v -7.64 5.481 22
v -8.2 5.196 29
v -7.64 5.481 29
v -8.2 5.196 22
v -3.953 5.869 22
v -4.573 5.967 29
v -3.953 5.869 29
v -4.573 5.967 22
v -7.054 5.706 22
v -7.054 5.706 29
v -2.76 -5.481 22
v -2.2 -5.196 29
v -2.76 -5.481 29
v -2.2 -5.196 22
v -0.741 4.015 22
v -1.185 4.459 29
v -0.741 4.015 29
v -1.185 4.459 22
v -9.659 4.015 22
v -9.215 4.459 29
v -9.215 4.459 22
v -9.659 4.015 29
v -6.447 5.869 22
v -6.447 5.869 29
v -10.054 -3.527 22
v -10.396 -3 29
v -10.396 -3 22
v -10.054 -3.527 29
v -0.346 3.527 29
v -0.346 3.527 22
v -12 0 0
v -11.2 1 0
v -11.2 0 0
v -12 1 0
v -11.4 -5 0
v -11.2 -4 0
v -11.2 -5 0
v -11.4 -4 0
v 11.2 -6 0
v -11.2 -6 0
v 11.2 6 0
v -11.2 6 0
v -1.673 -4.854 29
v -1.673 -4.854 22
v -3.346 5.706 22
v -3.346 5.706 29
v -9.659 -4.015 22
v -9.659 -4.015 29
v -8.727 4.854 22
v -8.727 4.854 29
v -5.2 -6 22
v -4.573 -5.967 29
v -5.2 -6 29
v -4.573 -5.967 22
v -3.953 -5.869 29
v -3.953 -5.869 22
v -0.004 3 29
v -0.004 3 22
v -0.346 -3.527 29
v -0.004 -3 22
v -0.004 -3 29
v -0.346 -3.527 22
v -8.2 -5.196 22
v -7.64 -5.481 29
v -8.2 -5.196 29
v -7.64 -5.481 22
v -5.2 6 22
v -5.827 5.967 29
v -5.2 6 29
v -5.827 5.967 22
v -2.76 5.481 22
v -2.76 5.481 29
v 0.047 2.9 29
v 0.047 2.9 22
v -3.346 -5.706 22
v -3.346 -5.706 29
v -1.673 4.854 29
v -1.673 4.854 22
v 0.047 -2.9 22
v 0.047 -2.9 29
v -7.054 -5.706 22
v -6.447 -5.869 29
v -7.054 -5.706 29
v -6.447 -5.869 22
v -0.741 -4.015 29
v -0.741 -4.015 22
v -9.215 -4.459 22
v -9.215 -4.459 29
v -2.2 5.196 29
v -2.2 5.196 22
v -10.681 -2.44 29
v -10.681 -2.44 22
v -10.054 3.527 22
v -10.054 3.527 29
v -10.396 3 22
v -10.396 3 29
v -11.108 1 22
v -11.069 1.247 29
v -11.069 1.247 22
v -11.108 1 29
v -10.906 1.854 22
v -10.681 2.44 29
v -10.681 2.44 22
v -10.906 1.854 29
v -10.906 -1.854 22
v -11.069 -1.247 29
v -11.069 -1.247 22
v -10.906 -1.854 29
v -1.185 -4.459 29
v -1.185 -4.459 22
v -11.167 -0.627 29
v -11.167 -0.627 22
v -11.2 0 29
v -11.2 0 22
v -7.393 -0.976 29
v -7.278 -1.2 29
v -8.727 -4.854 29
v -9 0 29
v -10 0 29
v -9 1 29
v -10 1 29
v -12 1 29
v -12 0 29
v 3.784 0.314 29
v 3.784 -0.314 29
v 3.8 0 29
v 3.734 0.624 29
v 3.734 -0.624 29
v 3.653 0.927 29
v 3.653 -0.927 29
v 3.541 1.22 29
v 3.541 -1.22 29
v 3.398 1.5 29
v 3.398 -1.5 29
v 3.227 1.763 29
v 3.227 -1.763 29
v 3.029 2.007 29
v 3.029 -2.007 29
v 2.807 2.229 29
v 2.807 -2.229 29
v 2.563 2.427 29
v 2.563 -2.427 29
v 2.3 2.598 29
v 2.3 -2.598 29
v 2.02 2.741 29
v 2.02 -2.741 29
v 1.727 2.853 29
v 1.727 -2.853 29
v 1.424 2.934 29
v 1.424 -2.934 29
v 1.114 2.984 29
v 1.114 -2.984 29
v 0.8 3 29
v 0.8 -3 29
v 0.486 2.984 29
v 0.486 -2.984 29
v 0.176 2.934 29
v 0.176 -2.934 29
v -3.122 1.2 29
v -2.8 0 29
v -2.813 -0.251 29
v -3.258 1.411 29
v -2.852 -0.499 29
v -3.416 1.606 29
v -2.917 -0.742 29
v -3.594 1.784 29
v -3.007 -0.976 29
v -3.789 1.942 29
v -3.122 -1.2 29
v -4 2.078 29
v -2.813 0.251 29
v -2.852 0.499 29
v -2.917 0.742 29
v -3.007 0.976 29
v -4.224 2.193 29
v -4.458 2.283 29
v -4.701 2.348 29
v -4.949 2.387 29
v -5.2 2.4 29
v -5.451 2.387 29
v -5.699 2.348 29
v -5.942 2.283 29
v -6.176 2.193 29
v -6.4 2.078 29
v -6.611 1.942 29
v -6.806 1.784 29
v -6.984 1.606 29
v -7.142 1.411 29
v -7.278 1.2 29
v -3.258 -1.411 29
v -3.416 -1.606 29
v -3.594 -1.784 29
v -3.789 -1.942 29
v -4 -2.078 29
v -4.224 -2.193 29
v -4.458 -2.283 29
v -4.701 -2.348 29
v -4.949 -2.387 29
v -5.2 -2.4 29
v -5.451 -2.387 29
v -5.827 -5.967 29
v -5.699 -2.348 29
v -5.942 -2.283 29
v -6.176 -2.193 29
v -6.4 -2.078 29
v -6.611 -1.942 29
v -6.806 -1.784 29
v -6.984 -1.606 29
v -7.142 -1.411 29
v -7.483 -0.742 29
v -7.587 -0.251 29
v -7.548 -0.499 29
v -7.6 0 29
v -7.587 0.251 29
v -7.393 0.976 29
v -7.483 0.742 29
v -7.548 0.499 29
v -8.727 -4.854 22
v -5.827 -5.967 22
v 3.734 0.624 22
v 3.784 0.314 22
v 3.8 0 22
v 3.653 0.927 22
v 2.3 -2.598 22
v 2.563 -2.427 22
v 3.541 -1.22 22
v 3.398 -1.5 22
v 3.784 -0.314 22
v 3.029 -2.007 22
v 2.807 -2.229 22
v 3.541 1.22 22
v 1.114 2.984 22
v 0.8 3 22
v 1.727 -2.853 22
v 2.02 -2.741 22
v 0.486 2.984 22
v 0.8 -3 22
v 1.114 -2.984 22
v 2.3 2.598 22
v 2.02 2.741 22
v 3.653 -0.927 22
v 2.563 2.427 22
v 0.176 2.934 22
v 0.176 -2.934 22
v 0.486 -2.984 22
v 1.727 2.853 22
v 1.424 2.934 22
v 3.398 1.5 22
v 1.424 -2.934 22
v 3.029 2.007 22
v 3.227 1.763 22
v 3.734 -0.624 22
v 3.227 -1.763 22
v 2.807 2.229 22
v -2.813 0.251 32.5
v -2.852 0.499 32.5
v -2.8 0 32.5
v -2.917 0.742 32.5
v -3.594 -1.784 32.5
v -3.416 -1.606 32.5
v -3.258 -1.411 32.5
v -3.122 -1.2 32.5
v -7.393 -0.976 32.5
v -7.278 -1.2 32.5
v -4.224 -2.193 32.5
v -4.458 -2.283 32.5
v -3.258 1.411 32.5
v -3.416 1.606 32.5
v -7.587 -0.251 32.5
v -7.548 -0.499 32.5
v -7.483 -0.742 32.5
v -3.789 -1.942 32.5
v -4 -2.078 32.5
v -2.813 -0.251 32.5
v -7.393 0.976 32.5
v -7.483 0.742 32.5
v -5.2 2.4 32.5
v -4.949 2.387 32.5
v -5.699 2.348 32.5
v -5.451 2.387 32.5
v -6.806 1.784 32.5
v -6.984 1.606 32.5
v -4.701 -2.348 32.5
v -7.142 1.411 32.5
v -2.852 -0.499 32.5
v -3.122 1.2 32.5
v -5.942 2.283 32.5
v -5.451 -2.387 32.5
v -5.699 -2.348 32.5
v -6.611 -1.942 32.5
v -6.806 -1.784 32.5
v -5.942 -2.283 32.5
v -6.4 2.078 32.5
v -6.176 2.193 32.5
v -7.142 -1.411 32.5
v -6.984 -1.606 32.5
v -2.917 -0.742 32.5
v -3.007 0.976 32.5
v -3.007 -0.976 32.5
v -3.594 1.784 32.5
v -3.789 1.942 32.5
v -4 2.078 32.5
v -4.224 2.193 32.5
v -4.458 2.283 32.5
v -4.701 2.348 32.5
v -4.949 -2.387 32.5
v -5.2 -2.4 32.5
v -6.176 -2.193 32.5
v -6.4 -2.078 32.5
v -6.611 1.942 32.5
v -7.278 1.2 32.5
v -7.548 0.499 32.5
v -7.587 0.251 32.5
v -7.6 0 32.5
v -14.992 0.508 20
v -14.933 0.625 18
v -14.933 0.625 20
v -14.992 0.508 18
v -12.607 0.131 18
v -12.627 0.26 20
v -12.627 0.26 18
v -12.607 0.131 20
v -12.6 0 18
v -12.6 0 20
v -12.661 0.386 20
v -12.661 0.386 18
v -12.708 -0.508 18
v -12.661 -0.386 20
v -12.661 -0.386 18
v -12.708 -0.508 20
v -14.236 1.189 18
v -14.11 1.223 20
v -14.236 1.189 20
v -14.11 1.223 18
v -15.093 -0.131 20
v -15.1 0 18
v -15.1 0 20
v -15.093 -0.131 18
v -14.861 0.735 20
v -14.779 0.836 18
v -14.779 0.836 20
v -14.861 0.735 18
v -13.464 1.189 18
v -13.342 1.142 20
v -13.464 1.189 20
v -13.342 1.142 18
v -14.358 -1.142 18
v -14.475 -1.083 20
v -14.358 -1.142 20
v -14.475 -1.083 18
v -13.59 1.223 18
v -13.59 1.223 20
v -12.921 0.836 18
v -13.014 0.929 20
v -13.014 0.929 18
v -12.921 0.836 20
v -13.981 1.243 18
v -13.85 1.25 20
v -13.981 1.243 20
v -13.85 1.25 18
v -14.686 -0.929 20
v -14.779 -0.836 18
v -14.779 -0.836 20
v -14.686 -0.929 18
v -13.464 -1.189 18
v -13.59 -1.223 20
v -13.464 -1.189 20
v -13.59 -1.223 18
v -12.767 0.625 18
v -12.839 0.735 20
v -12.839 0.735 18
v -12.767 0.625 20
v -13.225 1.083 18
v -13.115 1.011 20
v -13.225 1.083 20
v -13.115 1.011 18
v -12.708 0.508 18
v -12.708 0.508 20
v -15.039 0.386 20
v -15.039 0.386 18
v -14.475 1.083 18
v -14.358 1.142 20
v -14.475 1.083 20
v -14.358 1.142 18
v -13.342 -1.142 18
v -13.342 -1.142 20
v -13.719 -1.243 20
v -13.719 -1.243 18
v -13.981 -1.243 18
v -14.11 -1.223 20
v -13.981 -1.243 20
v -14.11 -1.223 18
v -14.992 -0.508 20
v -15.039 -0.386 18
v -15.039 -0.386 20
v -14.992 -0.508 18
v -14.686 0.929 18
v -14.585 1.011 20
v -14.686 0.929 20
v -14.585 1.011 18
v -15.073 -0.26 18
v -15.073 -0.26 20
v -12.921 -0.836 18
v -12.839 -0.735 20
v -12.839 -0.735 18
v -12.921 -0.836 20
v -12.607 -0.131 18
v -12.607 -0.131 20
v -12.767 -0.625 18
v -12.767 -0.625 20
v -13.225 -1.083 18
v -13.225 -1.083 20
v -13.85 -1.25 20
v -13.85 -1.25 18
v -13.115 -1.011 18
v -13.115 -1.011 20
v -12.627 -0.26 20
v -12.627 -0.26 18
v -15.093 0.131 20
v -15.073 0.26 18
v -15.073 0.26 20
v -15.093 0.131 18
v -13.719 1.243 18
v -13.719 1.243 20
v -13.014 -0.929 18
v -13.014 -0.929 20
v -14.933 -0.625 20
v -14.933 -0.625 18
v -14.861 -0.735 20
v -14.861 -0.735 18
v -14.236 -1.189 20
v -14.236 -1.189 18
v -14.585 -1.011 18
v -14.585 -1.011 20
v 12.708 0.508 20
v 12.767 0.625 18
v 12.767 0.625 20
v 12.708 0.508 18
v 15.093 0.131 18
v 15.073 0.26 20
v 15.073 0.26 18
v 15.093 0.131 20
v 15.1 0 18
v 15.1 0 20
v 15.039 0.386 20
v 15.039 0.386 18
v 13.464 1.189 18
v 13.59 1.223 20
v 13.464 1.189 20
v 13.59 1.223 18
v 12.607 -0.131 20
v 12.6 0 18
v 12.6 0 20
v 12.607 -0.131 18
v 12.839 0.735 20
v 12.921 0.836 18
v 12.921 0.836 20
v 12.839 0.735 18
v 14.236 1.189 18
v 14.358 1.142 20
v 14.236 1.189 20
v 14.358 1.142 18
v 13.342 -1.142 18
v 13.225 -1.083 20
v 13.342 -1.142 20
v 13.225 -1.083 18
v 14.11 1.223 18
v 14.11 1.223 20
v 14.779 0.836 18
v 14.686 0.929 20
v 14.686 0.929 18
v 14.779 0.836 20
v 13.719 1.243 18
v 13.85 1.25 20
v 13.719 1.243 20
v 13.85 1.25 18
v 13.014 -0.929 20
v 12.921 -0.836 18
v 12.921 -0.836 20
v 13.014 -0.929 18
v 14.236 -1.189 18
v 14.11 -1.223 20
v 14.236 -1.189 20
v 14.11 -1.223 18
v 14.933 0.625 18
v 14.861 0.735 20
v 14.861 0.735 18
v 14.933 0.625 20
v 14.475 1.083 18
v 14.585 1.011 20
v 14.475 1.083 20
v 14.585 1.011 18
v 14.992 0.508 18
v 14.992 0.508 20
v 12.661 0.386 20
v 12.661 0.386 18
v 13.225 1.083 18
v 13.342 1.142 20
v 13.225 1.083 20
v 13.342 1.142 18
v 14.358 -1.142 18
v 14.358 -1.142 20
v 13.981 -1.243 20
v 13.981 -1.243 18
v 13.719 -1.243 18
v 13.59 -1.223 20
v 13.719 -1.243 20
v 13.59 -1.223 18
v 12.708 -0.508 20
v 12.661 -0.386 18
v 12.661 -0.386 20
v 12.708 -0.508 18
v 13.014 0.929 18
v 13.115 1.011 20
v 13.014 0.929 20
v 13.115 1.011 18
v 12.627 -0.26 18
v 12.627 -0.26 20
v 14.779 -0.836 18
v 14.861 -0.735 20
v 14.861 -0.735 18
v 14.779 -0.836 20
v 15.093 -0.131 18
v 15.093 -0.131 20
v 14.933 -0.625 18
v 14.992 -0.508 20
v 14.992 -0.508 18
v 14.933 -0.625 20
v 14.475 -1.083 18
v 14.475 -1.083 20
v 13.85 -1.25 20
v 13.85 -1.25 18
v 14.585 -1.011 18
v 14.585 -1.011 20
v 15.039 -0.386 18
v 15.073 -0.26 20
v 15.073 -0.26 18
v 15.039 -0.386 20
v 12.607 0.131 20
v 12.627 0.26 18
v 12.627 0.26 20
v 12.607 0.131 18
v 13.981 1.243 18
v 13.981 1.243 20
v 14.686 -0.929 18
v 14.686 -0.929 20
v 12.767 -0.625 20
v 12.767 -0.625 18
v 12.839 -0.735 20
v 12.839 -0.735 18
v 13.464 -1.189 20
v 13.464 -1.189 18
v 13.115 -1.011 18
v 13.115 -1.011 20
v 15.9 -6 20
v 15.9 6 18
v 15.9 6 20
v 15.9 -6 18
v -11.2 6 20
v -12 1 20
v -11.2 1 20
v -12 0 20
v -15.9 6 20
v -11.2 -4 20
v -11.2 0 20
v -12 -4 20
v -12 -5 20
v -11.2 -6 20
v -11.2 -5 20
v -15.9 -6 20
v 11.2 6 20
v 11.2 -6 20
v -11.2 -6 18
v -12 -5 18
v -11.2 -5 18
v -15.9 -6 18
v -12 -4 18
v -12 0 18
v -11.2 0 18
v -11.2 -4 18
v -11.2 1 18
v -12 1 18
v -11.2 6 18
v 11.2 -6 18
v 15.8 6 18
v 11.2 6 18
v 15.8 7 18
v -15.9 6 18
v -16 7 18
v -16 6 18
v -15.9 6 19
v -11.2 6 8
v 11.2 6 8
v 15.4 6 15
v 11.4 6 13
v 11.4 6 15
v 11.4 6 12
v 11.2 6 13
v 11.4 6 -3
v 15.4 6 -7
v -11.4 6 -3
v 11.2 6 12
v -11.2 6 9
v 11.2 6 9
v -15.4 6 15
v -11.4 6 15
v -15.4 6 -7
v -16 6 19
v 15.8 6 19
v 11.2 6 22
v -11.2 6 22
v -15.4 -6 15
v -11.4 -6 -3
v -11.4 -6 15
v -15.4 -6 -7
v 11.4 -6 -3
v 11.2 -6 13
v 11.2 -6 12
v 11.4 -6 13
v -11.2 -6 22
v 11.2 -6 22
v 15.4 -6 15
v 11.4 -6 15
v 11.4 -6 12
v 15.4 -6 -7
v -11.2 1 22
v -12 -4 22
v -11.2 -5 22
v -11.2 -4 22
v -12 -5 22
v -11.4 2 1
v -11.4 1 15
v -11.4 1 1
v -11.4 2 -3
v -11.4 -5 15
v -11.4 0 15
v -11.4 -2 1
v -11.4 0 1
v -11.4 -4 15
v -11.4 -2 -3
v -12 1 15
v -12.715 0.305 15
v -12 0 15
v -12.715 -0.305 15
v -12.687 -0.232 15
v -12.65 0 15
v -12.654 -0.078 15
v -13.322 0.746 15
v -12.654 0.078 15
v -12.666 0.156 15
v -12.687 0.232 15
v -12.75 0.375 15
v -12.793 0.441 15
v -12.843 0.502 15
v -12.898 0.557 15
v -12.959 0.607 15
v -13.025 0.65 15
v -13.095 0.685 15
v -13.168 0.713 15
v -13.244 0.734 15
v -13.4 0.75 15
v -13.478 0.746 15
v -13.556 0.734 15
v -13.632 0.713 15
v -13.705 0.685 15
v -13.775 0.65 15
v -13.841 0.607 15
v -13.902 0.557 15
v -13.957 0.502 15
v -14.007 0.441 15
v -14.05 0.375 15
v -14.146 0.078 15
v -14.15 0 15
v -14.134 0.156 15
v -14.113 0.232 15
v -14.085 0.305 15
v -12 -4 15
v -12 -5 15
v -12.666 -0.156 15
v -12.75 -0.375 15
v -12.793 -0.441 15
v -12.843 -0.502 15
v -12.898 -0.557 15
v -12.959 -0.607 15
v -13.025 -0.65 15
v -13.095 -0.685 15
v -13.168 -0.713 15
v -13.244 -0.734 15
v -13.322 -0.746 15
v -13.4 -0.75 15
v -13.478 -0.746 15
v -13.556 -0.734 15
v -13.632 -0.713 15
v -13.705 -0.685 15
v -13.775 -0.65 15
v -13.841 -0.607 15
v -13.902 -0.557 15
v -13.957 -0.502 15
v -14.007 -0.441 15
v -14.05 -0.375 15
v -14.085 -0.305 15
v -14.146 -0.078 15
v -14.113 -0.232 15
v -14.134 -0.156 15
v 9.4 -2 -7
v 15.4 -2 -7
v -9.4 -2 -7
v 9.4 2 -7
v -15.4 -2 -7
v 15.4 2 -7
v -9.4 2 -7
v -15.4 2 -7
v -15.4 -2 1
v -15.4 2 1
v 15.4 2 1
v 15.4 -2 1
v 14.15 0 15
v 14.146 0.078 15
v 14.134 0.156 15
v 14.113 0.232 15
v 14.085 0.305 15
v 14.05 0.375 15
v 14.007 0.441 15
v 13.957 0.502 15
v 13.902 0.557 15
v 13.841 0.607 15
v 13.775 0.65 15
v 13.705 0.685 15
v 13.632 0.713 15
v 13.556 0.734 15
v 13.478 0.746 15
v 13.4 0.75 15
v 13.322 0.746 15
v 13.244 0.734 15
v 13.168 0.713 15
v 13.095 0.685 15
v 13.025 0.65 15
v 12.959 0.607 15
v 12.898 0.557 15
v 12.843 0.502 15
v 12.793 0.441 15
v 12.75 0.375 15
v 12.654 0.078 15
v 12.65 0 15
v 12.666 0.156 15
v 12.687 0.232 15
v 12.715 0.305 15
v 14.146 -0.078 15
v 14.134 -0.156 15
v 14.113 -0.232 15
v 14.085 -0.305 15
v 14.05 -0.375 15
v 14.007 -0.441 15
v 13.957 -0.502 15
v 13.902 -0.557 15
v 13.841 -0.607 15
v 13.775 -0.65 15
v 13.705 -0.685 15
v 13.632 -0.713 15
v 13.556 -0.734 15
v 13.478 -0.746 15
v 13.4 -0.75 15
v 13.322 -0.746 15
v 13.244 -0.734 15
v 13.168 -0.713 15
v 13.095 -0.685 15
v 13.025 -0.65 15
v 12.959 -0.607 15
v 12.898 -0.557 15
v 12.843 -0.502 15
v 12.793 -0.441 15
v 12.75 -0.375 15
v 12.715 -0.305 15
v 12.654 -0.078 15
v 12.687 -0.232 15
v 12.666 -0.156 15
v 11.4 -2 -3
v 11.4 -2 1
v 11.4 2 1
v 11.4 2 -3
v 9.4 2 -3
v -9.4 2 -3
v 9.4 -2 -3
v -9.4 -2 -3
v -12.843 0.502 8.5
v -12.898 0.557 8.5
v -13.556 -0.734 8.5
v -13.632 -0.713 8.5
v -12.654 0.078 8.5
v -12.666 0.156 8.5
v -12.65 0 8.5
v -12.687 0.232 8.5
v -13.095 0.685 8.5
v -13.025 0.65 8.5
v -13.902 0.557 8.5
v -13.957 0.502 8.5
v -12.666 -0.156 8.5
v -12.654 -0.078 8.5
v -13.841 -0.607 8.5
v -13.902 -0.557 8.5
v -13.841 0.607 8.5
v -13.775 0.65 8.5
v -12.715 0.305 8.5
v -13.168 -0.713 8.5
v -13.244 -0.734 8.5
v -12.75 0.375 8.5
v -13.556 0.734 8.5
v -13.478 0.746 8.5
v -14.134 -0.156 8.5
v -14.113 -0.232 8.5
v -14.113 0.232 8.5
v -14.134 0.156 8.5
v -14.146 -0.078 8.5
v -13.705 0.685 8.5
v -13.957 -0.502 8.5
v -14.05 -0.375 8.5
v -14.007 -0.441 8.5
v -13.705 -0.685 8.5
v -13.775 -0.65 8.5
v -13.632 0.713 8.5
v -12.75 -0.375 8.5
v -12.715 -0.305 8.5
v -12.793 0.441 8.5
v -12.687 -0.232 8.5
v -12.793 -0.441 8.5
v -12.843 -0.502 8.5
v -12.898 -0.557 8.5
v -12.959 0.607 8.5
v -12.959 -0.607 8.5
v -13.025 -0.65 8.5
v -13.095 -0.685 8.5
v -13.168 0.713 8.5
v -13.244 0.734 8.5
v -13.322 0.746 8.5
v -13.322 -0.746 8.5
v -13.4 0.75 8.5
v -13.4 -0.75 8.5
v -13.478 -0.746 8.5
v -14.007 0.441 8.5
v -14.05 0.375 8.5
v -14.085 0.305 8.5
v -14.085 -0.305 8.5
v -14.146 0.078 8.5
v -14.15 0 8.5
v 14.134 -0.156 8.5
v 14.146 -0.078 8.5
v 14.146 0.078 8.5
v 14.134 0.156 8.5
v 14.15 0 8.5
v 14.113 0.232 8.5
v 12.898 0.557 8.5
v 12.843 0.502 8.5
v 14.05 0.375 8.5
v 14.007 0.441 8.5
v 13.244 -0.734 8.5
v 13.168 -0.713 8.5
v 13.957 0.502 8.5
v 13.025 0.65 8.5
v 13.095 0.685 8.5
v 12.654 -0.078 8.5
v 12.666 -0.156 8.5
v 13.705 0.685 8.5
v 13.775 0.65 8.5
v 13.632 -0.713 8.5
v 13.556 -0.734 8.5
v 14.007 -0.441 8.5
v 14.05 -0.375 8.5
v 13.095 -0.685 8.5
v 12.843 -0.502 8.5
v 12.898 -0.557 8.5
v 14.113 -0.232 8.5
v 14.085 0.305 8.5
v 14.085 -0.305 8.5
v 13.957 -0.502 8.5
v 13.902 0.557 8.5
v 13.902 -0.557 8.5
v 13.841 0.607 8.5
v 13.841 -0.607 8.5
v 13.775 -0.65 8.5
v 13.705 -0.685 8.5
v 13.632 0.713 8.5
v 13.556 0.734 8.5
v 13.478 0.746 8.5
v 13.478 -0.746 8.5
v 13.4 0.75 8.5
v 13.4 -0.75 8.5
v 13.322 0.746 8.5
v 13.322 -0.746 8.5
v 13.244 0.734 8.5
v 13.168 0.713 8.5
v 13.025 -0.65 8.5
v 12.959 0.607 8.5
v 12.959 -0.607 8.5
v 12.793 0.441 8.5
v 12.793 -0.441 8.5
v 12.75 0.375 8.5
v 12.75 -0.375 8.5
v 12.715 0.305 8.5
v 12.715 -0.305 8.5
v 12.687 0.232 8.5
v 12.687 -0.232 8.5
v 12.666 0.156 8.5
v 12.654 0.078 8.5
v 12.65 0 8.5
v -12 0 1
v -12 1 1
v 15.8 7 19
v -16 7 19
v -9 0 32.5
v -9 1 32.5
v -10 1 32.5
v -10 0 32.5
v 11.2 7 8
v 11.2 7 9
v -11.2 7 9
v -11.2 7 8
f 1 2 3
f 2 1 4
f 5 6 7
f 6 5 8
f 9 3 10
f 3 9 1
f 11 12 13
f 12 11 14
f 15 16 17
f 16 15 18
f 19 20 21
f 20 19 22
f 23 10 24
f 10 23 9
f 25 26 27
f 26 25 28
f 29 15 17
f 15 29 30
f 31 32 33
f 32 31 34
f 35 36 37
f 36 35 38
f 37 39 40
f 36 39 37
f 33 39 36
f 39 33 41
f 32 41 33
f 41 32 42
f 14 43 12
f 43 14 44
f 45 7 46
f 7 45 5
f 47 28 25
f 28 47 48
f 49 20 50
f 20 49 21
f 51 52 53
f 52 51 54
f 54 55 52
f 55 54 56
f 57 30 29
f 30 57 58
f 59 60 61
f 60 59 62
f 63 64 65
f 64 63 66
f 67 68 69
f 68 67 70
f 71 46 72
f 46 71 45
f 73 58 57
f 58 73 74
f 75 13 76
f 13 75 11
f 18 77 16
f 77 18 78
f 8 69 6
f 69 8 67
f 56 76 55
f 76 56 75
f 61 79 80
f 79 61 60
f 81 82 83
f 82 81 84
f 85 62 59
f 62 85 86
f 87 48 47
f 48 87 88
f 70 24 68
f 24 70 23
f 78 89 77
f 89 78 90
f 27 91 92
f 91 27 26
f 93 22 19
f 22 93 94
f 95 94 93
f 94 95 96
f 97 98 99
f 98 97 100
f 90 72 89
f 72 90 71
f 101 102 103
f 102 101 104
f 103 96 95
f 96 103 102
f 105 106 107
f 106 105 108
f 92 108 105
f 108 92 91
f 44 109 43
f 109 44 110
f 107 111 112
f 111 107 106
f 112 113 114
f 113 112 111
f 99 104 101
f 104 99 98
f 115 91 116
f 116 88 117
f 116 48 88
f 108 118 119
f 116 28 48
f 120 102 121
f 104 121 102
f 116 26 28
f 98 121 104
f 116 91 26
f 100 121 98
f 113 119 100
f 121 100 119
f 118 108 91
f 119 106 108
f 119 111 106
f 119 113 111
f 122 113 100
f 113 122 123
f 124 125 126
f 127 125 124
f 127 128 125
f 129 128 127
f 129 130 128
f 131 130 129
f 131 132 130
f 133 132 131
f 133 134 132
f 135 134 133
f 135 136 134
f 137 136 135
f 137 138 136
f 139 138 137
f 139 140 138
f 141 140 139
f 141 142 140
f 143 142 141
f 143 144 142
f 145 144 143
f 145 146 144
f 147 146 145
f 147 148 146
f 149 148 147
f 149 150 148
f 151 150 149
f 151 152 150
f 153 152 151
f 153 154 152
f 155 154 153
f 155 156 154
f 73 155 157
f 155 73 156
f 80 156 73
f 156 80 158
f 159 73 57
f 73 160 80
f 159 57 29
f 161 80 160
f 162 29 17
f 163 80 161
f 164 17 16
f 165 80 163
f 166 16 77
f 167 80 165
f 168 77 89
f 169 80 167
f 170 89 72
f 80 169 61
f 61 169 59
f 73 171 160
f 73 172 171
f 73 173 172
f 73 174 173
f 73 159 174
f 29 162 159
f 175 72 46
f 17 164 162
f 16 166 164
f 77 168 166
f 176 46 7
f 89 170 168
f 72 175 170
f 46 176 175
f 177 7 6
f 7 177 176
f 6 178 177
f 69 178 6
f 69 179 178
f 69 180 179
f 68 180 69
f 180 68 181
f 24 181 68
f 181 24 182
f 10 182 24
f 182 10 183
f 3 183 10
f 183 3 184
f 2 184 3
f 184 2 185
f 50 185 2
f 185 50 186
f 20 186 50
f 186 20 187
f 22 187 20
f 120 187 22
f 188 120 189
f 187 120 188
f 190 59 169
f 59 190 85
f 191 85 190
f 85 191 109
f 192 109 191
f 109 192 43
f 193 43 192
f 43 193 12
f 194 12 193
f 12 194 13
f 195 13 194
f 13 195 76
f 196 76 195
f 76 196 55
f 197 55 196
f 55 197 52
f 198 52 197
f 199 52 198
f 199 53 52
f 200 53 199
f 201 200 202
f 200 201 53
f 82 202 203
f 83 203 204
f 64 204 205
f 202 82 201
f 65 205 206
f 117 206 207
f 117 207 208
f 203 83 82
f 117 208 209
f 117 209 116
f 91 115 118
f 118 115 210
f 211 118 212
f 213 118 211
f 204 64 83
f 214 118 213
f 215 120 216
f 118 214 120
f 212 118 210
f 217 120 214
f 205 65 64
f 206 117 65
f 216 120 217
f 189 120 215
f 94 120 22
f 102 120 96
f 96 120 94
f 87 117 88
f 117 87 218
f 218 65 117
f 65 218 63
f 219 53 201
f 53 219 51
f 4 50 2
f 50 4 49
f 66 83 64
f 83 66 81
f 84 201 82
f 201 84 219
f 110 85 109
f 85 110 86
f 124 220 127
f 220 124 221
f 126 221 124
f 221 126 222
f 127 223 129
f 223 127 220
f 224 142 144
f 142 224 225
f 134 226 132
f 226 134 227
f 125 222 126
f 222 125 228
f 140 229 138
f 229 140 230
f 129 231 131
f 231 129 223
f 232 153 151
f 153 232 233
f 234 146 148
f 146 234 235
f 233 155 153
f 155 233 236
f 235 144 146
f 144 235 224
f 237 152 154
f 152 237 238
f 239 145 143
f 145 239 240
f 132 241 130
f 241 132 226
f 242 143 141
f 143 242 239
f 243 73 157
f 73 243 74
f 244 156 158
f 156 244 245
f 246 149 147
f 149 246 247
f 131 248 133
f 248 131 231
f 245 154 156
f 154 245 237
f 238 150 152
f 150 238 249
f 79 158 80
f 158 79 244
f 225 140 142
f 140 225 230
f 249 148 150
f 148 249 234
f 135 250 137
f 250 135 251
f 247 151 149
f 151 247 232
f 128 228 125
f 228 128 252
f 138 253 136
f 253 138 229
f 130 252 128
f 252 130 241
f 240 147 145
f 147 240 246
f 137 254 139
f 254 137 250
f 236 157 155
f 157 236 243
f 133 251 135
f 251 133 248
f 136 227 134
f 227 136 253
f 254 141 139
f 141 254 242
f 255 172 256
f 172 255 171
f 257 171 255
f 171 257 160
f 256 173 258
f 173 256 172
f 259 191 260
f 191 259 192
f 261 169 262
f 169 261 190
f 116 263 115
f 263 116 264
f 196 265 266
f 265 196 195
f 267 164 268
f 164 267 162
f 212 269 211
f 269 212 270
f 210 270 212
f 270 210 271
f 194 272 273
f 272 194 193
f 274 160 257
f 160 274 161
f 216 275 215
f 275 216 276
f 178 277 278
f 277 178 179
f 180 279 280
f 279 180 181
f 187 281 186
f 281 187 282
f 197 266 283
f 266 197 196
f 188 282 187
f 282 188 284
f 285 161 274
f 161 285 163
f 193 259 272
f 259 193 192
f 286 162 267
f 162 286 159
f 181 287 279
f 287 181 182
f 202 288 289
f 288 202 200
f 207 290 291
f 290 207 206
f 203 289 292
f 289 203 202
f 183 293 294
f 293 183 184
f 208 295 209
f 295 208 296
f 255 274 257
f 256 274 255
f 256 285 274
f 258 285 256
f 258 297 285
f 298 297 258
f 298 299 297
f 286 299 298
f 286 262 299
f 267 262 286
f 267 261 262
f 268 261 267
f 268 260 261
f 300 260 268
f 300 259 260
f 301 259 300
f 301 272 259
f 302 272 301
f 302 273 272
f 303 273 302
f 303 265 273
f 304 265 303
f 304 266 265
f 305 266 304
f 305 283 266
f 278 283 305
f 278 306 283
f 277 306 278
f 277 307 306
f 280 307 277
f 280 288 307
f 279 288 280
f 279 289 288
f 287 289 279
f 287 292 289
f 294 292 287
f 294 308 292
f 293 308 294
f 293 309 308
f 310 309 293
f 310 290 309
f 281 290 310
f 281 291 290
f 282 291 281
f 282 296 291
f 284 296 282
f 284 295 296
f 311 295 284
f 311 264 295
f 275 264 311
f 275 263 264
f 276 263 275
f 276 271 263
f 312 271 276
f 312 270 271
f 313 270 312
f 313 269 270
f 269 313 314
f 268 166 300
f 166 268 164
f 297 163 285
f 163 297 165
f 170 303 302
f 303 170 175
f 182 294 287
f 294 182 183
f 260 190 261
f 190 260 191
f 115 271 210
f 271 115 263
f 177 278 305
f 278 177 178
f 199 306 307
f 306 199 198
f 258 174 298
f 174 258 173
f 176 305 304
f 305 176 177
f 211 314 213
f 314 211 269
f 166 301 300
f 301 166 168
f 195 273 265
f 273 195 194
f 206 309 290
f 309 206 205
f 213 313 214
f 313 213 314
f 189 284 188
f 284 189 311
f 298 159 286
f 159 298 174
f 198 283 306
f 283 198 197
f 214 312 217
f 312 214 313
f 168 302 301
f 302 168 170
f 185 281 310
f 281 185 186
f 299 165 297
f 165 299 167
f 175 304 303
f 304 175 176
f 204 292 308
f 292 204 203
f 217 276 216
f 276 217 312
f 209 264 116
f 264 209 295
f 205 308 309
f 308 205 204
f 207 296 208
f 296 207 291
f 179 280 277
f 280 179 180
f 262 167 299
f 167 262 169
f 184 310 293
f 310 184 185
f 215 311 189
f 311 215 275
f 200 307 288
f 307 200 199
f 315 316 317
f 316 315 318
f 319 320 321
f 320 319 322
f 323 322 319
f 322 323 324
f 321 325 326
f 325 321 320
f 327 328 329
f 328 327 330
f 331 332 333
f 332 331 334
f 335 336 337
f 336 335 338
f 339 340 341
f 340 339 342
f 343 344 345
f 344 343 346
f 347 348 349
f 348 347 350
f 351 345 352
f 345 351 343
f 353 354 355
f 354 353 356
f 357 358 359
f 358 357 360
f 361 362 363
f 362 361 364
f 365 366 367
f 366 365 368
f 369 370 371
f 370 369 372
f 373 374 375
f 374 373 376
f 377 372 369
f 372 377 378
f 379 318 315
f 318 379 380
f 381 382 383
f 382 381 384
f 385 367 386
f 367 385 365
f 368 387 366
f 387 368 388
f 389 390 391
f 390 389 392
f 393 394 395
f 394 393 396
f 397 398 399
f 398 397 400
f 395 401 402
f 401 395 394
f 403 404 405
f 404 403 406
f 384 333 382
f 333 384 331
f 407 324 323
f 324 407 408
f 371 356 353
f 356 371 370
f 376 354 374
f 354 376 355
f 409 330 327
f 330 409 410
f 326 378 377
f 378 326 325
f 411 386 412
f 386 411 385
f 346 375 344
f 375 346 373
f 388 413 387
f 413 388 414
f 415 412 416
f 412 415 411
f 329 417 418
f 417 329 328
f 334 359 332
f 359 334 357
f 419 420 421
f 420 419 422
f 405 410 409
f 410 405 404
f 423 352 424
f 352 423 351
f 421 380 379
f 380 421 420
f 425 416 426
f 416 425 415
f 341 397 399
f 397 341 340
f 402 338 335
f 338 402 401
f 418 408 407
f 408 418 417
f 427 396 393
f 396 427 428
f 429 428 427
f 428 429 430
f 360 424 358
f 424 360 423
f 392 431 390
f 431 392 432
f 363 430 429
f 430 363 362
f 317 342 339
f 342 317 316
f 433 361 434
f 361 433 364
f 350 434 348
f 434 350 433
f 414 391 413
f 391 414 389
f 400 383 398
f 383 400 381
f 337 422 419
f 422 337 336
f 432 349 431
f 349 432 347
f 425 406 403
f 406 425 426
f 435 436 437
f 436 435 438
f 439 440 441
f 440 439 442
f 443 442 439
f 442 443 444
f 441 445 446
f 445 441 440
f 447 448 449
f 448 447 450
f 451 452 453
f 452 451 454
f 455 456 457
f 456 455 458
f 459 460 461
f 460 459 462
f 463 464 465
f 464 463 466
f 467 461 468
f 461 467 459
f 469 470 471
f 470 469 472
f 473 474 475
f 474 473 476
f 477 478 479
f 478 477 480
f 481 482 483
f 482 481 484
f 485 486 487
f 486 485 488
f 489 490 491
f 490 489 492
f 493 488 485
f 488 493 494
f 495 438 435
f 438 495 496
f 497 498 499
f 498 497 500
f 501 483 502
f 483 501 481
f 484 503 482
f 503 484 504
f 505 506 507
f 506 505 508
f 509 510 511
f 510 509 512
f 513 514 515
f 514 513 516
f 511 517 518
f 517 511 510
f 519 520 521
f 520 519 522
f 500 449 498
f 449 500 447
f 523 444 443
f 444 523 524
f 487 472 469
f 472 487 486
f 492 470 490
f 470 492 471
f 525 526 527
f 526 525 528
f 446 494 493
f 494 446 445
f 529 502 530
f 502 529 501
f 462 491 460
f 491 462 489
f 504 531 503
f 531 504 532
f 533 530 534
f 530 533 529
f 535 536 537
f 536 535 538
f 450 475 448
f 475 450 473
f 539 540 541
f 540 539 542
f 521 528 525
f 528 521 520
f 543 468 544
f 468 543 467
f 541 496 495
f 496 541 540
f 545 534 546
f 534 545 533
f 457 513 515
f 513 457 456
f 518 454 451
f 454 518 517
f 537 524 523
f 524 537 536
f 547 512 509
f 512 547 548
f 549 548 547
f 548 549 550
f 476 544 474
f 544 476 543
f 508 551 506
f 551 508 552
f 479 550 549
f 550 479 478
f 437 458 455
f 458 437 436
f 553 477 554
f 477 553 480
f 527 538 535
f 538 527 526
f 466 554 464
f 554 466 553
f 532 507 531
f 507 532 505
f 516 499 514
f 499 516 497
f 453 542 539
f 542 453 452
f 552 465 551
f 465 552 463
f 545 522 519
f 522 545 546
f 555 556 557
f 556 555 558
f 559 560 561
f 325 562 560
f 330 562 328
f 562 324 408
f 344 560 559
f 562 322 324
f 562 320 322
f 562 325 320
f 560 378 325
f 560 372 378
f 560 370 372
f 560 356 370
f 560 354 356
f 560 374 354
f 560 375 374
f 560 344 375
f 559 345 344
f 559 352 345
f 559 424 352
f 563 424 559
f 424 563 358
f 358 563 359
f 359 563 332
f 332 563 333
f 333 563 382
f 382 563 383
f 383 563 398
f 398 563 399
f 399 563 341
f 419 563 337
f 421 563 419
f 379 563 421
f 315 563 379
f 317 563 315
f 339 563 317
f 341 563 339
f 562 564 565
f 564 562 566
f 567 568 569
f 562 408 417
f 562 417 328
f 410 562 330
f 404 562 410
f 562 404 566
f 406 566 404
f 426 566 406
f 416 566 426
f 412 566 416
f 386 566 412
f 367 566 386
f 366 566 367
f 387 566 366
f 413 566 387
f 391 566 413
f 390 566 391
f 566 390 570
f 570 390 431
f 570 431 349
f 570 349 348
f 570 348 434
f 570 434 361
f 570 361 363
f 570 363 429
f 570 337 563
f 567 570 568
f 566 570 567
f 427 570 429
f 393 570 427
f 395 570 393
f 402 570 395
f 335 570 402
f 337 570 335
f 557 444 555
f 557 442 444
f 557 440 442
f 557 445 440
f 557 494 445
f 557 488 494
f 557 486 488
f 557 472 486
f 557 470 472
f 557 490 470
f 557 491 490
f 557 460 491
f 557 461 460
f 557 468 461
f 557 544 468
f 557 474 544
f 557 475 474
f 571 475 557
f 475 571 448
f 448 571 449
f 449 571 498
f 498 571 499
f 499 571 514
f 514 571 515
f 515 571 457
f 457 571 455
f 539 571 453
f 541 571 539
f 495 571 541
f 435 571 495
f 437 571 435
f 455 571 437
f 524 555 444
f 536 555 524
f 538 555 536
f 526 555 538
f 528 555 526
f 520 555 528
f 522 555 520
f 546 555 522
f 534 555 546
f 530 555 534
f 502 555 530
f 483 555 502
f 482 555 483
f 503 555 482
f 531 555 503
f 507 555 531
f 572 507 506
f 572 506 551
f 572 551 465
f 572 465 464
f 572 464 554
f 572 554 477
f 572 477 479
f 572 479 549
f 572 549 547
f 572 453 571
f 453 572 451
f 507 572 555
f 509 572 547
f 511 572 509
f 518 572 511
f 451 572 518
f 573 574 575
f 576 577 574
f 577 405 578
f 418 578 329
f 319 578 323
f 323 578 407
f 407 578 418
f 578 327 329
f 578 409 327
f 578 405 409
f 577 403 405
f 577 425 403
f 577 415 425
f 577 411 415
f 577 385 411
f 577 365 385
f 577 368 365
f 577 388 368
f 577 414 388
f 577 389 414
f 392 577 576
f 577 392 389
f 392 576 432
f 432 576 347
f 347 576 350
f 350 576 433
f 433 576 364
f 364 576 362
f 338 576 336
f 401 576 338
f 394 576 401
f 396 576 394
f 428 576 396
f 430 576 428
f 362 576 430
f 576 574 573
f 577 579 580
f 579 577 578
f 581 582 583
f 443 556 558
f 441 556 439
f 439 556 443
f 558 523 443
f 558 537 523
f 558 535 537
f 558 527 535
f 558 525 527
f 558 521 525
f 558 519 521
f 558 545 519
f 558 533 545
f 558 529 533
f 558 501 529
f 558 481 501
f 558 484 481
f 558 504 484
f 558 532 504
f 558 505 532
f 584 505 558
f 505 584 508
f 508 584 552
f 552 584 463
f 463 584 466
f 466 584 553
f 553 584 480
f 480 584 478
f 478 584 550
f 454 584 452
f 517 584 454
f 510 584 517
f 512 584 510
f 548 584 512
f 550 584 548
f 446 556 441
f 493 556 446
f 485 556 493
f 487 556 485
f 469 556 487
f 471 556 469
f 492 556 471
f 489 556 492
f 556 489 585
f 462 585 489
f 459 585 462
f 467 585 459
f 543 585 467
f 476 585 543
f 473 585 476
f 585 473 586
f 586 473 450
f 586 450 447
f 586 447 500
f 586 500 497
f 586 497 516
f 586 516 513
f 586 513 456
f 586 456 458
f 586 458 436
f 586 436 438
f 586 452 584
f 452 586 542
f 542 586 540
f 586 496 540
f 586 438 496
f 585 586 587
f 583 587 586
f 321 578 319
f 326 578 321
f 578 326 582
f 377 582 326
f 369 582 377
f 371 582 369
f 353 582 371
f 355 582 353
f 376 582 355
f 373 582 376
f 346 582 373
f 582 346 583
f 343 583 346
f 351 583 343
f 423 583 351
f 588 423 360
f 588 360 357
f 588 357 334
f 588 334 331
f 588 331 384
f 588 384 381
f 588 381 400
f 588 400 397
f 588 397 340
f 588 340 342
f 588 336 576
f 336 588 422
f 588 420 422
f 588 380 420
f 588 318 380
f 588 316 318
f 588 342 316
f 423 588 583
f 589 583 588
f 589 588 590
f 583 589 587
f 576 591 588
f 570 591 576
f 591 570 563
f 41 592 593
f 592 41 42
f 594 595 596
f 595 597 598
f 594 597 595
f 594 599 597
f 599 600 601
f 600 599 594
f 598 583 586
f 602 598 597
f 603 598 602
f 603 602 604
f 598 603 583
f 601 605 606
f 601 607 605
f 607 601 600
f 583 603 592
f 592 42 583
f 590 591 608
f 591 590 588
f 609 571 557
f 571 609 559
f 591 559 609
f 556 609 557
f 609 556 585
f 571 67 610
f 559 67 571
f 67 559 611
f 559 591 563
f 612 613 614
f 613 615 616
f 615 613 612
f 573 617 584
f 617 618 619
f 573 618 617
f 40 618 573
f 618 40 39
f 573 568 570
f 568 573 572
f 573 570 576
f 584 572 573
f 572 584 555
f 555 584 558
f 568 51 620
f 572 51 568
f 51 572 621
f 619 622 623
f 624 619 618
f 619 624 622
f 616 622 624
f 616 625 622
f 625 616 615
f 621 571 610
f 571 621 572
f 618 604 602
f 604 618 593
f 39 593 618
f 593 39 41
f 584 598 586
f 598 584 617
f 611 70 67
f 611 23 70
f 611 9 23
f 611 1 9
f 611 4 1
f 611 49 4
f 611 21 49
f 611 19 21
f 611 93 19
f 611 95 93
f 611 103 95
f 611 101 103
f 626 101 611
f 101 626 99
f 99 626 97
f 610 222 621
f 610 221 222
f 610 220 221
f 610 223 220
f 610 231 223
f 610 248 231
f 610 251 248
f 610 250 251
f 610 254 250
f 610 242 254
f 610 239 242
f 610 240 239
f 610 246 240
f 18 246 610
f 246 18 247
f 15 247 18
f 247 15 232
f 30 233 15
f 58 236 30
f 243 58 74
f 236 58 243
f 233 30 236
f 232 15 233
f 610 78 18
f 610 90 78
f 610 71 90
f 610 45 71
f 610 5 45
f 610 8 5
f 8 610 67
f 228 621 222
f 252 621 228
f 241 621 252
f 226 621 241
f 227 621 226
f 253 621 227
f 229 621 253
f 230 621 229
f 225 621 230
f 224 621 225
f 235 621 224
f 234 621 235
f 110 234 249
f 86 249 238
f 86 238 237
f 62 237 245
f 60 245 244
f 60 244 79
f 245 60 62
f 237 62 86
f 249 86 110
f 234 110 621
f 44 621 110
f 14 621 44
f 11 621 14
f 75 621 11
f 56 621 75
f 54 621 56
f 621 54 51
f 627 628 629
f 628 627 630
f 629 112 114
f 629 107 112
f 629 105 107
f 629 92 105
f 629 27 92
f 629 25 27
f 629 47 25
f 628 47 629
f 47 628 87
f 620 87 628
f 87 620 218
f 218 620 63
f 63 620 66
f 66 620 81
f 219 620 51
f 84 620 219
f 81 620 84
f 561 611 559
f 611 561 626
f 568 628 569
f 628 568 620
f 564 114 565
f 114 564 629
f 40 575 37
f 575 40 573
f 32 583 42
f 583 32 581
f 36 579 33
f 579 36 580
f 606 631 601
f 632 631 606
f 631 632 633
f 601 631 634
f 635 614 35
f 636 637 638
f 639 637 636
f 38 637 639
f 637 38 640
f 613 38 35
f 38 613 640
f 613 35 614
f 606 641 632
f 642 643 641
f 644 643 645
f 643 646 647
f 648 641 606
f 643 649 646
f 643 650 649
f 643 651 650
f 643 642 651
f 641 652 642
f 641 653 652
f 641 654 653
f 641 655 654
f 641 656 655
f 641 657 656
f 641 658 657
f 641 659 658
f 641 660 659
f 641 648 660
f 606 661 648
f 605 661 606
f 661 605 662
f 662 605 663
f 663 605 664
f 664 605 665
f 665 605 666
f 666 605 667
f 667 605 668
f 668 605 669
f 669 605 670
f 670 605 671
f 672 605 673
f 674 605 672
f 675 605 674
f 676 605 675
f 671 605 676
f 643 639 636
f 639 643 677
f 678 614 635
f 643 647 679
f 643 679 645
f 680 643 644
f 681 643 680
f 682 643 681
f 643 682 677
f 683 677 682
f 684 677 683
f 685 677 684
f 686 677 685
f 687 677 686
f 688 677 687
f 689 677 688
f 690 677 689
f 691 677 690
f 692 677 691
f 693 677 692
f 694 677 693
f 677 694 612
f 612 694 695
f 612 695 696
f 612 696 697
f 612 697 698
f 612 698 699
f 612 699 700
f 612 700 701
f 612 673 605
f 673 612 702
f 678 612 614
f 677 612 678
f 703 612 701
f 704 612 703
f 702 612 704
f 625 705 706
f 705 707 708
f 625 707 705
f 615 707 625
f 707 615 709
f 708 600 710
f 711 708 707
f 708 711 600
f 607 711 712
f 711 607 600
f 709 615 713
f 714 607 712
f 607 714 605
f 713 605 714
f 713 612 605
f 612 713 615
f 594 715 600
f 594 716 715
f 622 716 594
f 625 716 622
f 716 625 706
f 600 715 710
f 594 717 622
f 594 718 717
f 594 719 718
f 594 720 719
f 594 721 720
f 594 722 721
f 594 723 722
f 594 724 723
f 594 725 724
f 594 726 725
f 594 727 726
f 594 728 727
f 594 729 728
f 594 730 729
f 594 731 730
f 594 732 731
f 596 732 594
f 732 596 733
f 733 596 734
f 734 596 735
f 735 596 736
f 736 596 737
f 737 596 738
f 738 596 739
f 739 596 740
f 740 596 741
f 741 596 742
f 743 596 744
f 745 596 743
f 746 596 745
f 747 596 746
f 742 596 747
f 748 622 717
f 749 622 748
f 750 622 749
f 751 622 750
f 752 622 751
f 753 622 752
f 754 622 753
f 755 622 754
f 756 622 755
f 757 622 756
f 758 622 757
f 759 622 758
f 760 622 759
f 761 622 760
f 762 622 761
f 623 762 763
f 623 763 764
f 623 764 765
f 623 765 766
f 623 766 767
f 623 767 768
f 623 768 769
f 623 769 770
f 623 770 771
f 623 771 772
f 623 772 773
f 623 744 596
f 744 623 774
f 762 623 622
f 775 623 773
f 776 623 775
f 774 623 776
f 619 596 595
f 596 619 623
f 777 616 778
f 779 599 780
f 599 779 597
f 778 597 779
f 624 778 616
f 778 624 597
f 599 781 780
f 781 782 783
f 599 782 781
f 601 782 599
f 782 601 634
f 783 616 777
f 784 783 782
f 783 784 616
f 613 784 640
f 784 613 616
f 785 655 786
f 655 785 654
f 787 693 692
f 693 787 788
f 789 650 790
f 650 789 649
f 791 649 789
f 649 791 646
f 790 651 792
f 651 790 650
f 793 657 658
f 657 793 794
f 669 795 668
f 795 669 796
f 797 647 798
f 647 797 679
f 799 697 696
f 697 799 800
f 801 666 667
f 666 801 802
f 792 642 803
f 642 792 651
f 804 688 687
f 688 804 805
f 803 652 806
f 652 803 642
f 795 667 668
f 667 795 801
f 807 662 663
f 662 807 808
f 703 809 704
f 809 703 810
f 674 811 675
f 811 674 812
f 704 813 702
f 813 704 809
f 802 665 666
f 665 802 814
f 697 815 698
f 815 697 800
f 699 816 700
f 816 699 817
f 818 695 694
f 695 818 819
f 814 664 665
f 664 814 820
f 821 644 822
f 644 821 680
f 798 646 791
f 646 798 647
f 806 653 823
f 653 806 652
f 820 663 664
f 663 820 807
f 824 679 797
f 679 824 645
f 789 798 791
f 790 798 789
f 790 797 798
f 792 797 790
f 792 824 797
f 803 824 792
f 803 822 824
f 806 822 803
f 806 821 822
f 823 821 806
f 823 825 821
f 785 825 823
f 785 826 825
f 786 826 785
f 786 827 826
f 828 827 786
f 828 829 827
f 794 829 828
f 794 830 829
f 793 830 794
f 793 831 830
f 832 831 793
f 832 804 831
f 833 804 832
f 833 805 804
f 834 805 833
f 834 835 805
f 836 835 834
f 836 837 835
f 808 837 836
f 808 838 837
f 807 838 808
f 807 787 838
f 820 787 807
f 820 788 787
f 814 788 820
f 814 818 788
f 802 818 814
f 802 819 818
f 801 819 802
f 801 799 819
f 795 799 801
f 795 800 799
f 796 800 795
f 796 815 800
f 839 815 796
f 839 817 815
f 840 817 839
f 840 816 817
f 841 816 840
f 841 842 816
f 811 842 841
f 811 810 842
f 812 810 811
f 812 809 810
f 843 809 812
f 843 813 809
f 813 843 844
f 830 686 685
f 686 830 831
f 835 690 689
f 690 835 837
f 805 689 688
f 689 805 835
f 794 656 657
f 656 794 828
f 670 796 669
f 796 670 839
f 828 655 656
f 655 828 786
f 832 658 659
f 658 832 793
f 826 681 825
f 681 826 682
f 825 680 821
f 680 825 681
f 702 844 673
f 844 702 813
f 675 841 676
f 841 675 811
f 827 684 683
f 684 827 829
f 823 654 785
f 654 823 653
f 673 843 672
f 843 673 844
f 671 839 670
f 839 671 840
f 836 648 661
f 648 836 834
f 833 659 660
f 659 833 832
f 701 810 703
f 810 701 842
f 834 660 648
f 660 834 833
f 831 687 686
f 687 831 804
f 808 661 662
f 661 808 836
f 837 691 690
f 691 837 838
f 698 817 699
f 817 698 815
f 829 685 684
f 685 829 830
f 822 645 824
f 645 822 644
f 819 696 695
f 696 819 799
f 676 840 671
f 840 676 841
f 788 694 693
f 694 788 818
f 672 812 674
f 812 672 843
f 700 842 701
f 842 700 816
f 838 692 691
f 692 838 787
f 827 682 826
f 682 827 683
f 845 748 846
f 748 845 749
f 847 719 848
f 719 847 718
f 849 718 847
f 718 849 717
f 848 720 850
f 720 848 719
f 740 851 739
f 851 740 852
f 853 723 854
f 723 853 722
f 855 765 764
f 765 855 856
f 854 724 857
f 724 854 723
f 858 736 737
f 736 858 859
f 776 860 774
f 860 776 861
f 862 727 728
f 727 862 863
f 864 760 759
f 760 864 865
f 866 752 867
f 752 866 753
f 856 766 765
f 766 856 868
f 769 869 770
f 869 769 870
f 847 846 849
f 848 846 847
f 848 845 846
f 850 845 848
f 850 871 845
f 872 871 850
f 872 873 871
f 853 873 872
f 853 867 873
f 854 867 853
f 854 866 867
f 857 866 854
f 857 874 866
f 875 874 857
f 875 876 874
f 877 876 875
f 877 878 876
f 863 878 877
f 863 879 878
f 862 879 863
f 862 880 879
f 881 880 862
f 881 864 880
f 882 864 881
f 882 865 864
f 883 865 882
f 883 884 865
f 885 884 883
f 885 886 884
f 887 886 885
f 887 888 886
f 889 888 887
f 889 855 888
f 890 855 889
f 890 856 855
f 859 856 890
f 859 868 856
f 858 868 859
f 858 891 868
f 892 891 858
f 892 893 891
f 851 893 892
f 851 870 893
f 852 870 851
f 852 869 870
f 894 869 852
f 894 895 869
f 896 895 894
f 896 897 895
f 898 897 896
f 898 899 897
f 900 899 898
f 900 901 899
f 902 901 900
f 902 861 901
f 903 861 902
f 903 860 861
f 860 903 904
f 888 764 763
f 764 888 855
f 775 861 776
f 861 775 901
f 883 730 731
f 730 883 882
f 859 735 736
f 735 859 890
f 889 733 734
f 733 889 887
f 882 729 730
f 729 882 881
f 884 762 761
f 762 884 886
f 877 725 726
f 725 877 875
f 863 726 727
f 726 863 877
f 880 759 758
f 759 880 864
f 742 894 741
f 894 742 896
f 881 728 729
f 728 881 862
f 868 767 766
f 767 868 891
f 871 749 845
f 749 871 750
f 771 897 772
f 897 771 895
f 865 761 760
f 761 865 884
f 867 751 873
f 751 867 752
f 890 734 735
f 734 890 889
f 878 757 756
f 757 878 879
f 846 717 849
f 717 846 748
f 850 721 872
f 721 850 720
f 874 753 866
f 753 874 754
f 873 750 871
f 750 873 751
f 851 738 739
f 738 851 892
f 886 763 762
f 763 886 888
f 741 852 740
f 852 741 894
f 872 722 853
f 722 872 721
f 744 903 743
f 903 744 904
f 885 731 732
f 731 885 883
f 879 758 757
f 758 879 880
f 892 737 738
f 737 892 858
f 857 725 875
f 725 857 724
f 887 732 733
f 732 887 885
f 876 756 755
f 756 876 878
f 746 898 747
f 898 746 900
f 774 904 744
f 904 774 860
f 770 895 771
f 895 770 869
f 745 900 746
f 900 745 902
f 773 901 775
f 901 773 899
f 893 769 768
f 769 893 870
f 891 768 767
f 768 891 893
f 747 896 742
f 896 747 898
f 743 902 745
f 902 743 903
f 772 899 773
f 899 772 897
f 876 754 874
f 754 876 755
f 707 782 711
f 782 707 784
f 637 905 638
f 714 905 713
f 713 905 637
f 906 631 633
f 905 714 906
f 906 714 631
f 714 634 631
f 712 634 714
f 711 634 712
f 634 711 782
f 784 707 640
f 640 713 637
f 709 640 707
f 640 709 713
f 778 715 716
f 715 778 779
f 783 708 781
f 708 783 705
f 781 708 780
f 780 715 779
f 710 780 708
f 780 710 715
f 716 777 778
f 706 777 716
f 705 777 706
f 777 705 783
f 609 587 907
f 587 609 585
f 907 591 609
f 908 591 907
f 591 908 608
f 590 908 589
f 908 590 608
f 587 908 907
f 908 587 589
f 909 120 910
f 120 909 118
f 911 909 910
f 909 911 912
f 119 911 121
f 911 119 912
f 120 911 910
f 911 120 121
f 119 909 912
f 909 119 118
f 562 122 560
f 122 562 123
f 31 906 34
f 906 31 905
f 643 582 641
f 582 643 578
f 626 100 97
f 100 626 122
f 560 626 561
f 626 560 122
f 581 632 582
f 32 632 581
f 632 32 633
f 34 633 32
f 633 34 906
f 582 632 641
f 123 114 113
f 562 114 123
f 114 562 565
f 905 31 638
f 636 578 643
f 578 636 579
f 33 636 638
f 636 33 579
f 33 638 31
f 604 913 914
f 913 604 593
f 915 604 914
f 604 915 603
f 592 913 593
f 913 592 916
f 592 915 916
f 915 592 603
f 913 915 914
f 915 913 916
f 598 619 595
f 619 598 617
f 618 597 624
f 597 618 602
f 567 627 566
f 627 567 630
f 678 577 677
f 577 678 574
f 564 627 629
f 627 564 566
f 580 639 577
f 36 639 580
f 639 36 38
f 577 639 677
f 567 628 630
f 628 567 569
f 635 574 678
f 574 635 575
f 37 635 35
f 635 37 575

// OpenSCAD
// file: motor-gear-mount.scad
// MG90S mount
include <motor-gears.scad>

MG_MOUNT_W = 4;
MG_MOUNT_D = 0.2;
MG_MOUNT_HOLE_D = MG90S_MOUNT_HOLE_D - 1;
MG_MOUNT_SIZE=[
    MG90S_BLOCK_SIZE.x + 2 * (MG_MOUNT_W + MG_MOUNT_D)
    , MG90S_BLOCK_SIZE.y
    , MG90S_MOUNT_OFFSET + MG_MOUNT_W
];


module gear_mount()
{
    $fn=60;
    dx = MG_MOUNT_SIZE.x / 2;
    dy = MG_MOUNT_SIZE.y / 2;
    dz = MG_MOUNT_W;
    
    difference()
    {
        union()
        {
            difference()
            {
                cube([MG_MOUNT_SIZE.x, MG_MOUNT_SIZE.y, MG_MOUNT_W], center=true);
                //translate([(MG90S_BLOCK_SIZE.x - MG90S_GEAR_D1) / 2, 0, 0])
                //cylinder(h = MG_MOUNT_W * 2, d = MG90S_MOUNT_HOLE_D, center = true);
            }
            
            translate([0, 0, (MG_MOUNT_SIZE.z - MG_MOUNT_W) / 2])
            {
                translate([-(dx - MG_MOUNT_W / 2), 0, 0])
                {
                    cube([MG_MOUNT_W, MG_MOUNT_SIZE.y, MG_MOUNT_SIZE.z], center=true);
                }
                
                translate([+(dx - MG_MOUNT_W / 2), 0, 0])
                {
                    cube([MG_MOUNT_W, MG_MOUNT_SIZE.y, MG_MOUNT_SIZE.z], center=true);
                }
            }
        }
        translate([0, 0, (MG_MOUNT_SIZE.z - MG_MOUNT_W) / 2])
        {
            translate([-(dx - MG_MOUNT_W / 2), 0, 10])
            {
                cylinder(h = MG_MOUNT_SIZE.z/2 , d = MG_MOUNT_HOLE_D, center = true);
            }
            
            translate([+(dx - MG_MOUNT_W / 2), 0, 10])
            {
                cylinder(h = MG_MOUNT_SIZE.z/2 , d = MG_MOUNT_HOLE_D, center = true);
            }
        }
        
        translate([-(dx - MG_MOUNT_W / 2), 0, MG_MOUNT_W / 2])
        {
             cube([MG_MOUNT_W * 2, 4, MG_MOUNT_W * 2], center=true);
        }
        translate([+(dx - MG_MOUNT_W / 2), 0, MG_MOUNT_W / 2])
        {
             cube([MG_MOUNT_W * 2, 4, MG_MOUNT_W * 2], center=true);
        }
    }
}

//gear_mount();
// file: motor-gears.scad
// motor-gear MG90S

MG90S_LAT_WIDTH=22.4;

// Total  , Width, Total Height
MG90S_FULL_SIZE = [31.8, 12, 32.5];
MG90S_BLOCK_SIZE = [MG90S_LAT_WIDTH, MG90S_FULL_SIZE.y, 22.0];
MG90S_MOUNT_SIZE = [MG90S_FULL_SIZE.x, MG90S_BLOCK_SIZE.y, 2];
MG90S_MOUNT_OFFSET = 18; // from bottom to mount height
MG90S_MOUNT_HOLE_POS = 27.7;
MG90S_MOUNT_HOLE_D = 2.5;

MG90S_GEAR_D1 = MG90S_FULL_SIZE.y;
MG90S_GEAR_D2 = MG90S_GEAR_D1 / 2;
MG90S_GEAR_D3 = 4.8; // terminal gear diameter
MG90S_GEAR_H1 = 29;
MG90S_GEAR_H2 = MG90S_FULL_SIZE.z;

module mg90s_gear()
{
    $fn=60;
    dt = MG90S_GEAR_D1 / 2;
    translate([dt, dt, 0])
    union()
    {
        color("Grey", 1) cylinder(h = MG90S_GEAR_H1, d = MG90S_GEAR_D1);
        translate([dt, 0, 0])
        {
            color("Grey", 1) cylinder(h = MG90S_GEAR_H1, d = MG90S_GEAR_D2);
        }
        color("Gold", 1) cylinder(h = MG90S_GEAR_H2, d = MG90S_GEAR_D3);
    }
}

// mount holes
module mg90s_mount(hole_d)
{
    dy = MG90S_MOUNT_SIZE.y / 2;
    dx = MG90S_MOUNT_SIZE.x / 2;
    translate([dx, dy, 0])
    {
        dt = MG90S_MOUNT_HOLE_POS / 2;
        h = MG90S_MOUNT_SIZE.z * 2+0.2;
        translate([-dt, 0, 0])
            cylinder(h = h, d = hole_d, center=true, $fn=60);
        translate([+dt, 0, 0])
            cylinder(h = h, d = hole_d, center=true, $fn=60);
    }
}



module mg90s()
{
    dy = MG90S_BLOCK_SIZE.y / 2;
    dx = MG90S_BLOCK_SIZE.x / 2;
    translate([-dx, -dy, 0])
    union()
    {
        // main block
        color("DimGrey", 1) cube(MG90S_BLOCK_SIZE);
        mg90s_gear();
        x_diff = MG90S_BLOCK_SIZE.x - MG90S_MOUNT_SIZE.x;
        // mount plane
        translate([x_diff/2, 0, MG90S_MOUNT_OFFSET])
        color("DarkGrey") 
        difference()
        {
            cube(MG90S_MOUNT_SIZE);
            mg90s_mount(MG90S_MOUNT_HOLE_D);
        }
    }
}

//mg90s();
// main file
include <motor-gears.scad>
include <motor-gear-mount.scad>

mg90s();

// Total Width
color("red") translate([-16,6,18])cube([MG90S_FULL_SIZE.x,1,1]);

// Total height
color("green")  translate([-10,0,0])cube([1,1,MG90S_FULL_SIZE.z]);

// Total height
color("green")  translate([-12,0,0])cube([1,1,MG90S_GEAR_H1]);

// LAT WIDTH
color("blue")  translate([-11.2,6,8])cube([MG90S_LAT_WIDTH,1,1]);

// 
color("cyan") rotate([0,0,90])translate([-6,-12,12])cube([MG90S_FULL_SIZE.y,1,1]);

// block height
rotate([0,90,0])translate([-22,-5,-12])cube([MG90S_BLOCK_SIZE.z,1,1]);

translate([0,0,-5]) gear_mount();
